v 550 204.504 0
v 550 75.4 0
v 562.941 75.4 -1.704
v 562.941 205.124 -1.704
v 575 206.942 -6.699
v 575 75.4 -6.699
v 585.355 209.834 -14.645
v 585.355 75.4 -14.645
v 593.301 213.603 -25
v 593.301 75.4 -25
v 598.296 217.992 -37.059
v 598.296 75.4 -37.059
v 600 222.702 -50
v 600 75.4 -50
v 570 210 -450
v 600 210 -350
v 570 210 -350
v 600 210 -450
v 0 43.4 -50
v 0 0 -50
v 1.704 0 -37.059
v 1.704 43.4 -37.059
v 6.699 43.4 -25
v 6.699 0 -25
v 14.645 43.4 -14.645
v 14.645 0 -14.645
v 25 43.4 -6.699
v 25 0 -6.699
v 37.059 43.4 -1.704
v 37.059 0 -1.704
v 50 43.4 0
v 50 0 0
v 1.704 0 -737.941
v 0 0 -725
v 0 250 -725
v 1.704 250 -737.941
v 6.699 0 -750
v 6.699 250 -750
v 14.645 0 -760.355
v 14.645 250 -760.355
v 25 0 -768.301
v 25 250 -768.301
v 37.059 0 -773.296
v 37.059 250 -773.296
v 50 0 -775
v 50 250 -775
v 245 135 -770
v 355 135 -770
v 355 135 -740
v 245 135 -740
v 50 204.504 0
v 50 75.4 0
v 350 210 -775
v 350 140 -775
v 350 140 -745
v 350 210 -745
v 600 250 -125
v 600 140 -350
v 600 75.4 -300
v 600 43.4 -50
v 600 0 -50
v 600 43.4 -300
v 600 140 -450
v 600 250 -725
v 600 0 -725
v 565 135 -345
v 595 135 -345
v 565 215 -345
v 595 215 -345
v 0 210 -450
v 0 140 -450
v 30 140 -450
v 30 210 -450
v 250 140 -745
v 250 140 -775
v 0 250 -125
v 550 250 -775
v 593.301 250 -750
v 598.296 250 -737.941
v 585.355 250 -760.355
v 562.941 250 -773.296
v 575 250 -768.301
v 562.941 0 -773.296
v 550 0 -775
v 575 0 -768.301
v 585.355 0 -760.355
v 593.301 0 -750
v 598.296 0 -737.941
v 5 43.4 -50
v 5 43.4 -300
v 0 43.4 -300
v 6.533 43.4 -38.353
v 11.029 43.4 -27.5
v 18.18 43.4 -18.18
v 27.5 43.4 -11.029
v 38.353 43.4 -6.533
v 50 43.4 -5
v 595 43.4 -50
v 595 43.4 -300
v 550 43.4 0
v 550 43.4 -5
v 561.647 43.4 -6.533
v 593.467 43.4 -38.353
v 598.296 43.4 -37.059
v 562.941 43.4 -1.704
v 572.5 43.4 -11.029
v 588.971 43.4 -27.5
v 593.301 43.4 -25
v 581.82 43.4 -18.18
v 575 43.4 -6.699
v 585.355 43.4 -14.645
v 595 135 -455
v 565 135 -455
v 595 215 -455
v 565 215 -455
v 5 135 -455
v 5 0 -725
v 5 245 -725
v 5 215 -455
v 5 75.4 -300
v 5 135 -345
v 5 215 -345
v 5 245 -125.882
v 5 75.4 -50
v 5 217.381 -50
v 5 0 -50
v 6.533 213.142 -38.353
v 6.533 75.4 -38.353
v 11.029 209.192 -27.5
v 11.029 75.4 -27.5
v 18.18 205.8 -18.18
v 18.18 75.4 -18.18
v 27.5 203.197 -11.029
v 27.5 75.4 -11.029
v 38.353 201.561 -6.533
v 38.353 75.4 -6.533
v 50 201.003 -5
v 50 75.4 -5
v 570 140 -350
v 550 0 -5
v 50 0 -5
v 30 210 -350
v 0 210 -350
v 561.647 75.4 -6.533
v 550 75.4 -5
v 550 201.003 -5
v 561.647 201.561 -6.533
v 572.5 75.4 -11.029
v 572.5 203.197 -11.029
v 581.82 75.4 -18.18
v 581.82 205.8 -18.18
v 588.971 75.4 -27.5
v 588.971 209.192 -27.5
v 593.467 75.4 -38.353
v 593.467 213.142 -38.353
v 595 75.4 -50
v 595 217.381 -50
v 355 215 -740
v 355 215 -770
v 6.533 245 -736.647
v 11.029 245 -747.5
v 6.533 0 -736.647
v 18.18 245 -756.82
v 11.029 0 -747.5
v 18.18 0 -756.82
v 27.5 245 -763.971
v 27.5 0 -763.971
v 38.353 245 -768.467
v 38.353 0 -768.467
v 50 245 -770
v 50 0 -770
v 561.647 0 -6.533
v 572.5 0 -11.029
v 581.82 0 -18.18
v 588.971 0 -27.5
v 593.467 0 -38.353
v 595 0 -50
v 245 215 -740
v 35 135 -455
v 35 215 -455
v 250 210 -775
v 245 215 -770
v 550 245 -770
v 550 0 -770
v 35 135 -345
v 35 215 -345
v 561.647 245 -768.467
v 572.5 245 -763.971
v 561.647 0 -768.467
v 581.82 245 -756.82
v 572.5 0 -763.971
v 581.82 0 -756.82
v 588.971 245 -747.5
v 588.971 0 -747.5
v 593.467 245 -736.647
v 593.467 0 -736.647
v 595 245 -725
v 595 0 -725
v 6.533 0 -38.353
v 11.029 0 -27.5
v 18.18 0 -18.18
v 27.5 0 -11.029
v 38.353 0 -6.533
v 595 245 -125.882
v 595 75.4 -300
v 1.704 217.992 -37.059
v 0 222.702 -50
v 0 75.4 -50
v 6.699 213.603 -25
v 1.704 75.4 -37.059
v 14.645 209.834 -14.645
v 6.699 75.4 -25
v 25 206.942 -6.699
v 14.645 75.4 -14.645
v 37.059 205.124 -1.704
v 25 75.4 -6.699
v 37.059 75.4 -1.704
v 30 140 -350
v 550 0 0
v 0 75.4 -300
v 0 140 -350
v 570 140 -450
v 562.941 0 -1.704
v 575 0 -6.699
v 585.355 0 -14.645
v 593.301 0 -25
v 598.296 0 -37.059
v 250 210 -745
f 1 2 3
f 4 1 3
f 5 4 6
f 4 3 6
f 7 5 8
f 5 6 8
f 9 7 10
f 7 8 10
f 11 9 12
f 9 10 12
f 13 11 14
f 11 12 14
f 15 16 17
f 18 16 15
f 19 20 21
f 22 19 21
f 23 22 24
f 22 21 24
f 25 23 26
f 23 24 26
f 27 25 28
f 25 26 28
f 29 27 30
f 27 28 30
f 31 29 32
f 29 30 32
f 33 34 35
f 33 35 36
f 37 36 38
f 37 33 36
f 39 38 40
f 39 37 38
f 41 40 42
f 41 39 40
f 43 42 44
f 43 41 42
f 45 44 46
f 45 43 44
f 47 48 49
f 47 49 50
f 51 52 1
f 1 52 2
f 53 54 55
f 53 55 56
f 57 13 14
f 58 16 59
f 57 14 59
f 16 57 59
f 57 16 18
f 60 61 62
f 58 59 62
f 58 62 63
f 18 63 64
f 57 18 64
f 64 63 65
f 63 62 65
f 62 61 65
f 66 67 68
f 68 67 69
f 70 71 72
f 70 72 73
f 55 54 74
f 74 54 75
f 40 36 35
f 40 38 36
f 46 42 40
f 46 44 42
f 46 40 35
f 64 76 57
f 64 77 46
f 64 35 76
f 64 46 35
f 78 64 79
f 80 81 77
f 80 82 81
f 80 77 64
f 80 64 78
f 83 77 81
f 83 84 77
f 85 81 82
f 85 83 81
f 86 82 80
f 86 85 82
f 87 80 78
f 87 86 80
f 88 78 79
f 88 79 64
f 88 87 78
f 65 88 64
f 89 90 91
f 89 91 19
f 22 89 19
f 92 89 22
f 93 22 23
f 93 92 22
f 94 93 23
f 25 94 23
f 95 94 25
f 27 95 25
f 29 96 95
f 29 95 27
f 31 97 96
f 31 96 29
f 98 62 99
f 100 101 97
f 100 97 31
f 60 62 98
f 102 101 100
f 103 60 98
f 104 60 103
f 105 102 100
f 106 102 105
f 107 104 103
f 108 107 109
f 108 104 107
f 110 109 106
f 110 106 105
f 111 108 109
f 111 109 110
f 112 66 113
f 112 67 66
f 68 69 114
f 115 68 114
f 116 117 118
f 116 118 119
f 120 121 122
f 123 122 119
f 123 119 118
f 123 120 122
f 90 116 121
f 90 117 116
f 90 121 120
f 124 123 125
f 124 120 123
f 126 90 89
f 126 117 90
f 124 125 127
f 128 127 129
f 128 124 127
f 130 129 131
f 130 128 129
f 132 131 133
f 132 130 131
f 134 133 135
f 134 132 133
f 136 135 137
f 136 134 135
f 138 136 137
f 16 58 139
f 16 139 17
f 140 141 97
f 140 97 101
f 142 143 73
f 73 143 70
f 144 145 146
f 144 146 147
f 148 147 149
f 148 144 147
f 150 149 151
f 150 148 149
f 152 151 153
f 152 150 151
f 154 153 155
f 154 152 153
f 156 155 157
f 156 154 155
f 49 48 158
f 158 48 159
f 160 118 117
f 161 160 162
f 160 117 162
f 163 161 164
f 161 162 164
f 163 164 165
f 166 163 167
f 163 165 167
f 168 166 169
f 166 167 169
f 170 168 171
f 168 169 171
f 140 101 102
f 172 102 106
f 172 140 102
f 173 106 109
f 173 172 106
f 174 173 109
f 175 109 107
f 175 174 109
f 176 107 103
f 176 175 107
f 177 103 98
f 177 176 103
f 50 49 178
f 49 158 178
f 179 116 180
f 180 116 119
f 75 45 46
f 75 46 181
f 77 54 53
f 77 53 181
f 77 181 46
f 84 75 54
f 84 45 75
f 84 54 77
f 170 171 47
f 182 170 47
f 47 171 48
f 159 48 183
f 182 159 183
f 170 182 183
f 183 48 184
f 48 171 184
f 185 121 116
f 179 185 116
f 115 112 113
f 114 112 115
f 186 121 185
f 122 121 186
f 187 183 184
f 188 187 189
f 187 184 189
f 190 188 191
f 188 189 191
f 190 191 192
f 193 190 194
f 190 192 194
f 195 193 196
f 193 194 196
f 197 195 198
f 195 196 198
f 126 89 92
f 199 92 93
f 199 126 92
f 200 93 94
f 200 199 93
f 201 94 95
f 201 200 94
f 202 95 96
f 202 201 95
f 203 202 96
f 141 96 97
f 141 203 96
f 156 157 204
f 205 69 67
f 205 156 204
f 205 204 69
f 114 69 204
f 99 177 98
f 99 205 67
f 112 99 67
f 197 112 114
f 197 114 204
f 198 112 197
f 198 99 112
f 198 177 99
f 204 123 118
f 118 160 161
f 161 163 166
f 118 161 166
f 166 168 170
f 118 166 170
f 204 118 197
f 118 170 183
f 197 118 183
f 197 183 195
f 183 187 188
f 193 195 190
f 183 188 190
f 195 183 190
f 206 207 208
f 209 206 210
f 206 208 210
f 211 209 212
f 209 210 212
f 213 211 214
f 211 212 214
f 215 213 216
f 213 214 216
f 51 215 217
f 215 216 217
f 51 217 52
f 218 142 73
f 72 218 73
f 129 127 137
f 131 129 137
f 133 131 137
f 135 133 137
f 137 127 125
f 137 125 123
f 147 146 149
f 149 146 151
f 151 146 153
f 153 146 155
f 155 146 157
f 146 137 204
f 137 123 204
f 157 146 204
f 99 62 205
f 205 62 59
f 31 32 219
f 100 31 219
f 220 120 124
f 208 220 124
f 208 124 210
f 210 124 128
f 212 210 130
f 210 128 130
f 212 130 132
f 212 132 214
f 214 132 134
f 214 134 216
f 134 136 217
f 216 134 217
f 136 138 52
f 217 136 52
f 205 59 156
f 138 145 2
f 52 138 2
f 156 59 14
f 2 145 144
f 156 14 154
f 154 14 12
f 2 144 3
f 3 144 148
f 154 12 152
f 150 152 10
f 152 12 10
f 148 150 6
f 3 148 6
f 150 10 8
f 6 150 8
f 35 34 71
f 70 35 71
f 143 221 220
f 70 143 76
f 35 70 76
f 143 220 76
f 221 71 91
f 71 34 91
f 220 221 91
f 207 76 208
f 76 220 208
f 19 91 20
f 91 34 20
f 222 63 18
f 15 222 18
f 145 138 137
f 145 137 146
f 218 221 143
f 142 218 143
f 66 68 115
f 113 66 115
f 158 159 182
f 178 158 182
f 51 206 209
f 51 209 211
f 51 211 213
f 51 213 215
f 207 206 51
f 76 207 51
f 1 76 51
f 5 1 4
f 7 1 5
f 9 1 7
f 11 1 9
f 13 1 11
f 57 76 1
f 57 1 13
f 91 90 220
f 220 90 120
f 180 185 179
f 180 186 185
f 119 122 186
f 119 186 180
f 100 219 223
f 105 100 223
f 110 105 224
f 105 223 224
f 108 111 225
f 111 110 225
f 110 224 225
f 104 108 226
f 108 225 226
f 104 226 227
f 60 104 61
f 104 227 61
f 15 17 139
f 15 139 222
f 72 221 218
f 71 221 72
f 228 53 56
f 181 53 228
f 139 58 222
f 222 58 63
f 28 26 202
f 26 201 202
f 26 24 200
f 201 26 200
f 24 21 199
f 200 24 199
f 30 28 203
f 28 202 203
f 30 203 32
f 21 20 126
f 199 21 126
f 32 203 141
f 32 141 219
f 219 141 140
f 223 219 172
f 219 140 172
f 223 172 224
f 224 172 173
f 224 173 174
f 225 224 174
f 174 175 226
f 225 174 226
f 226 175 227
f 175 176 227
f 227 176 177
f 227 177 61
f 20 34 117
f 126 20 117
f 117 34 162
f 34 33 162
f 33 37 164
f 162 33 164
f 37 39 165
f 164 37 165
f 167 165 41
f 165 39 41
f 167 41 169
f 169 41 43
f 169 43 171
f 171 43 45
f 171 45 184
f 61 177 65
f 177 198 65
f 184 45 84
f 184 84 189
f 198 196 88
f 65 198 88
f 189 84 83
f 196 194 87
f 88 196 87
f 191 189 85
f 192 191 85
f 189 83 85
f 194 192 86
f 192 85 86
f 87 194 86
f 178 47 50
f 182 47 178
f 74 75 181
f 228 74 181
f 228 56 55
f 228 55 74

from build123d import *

# Parameters (mm, degrees)
BOSS_EXTRUDE1_DEPTH     = 200
BOSS_EXTRUDE2_DEPTH     = 50
DRAFT2_START            = 200
DRAFT2_DEPTH            = 50
DRAFT2_START_2          = 192.170637281
DRAFT2_2_OUTLINE_W      = 602
DRAFT2_2_OUTLINE_H      = 136
DRAFT2_2_DEPTH          = 43.829362719
SKETCH12_W              = 100
SKETCH12_H              = 70
CUT_EXTRUDE4_DEPTH      = 30
SKETCH14_W              = 100
SKETCH14_H              = 70
CUT_EXTRUDE5_DEPTH      = 30
SKETCH13_W              = 100
SKETCH13_H              = 70
CUT_EXTRUDE2_DEPTH      = 30
SHELL1_T                = -5
CUT_EXTRUDE6_DEPTH      = 1012.496416207
CUT_EXTRUDE6_DEPTH_BACK = 1012.496416207
SKETCH15_W              = 300
SKETCH15_H              = 32


with BuildPart() as part:
    # Sketch1 → Boss-Extrude1 (new body)
    with BuildSketch(Plane(origin=(0, 0, 0), x_dir=(1, 0, 0), z_dir=(0, 1, 0))):
        with BuildLine():
            Line((50, 0), (550, 0))
            ThreePointArc((550, 0), (585.355339059, 14.644660941), (600, 50))
            Line((600, 50), (600, 725))
            ThreePointArc((600, 725), (585.355339059, 760.355339059), (550, 775))
            Line((550, 775), (50, 775))
            ThreePointArc((50, 775), (14.644660941, 760.355339059), (0, 725))
            Line((0, 725), (0, 50))
            ThreePointArc((0, 50), (14.644660941, 14.644660941), (50, 0))
        make_face()
    extrude(amount=BOSS_EXTRUDE1_DEPTH)

    # Sketch5 → Boss-Extrude2 (add)
    with BuildSketch(Plane(origin=(0, 200, 0), x_dir=(1, 0, 0), z_dir=(0, 1, 0))):
        with BuildLine():
            Line((600, 125), (0, 125))
            Line((0, 125), (0, 725))
            ThreePointArc((0, 725), (14.644660941, 760.355339059), (50, 775))
            Line((50, 775), (550, 775))
            ThreePointArc((550, 775), (585.355339059, 760.355339059), (600, 725))
            Line((600, 725), (600, 125))
        make_face()
    extrude(amount=BOSS_EXTRUDE2_DEPTH)

    # Draft2: read off the stored shape, not the designer's step
    # Draft2 outline → Draft2 (add)
    with BuildSketch(Plane(origin=(0, 0, 0), x_dir=(1, 0, 0), z_dir=(0, 1, 0)).offset(DRAFT2_START)):
        with BuildLine():
            ThreePointArc((550, 0), (585.355339059, 14.644660941), (600, 50))
            Line((600, 50), (600, 125))
            Line((600, 125), (0, 125))
            Line((0, 125), (0, 50))
            ThreePointArc((0, 50), (14.644660941, 14.644660941), (50, 0))
            Line((50, 0), (550, 0))
        make_face()
    extrude(amount=DRAFT2_DEPTH)

    # Draft2 2 outline → Draft2 2 (cut)
    with BuildSketch(Plane(origin=(0, 0, 0), x_dir=(1, 0, 0), z_dir=(0, 0.9396926207859094, 0.34202014332566616)).offset(DRAFT2_START_2)):
        with Locations((300, 136)):
            Rectangle(DRAFT2_2_OUTLINE_W, DRAFT2_2_OUTLINE_H)
    extrude(amount=DRAFT2_2_DEPTH, mode=Mode.SUBTRACT)

    # Sketch12 → Cut-Extrude4 (cut)
    with BuildSketch(Plane(origin=(0, 0, 0), x_dir=(0, 0, -1), z_dir=(1, 0, 0))):
        with Locations((400, 175)):
            Rectangle(SKETCH12_W, SKETCH12_H)
    extrude(amount=CUT_EXTRUDE4_DEPTH, mode=Mode.SUBTRACT)

    # Sketch14 → Cut-Extrude5 (cut)
    with BuildSketch(Plane(origin=(600, 0, 0), x_dir=(0, 0, -1), z_dir=(1, 0, 0))):
        with Locations((400, 175)):
            Rectangle(SKETCH14_W, SKETCH14_H)
    extrude(amount=-CUT_EXTRUDE5_DEPTH, mode=Mode.SUBTRACT)

    # Sketch13 → Cut-Extrude2 (cut)
    with BuildSketch(Plane(origin=(0, 0, -775), x_dir=(-1, 0, 0), z_dir=(0, 0, -1))):
        with Locations((-300, 175)):
            Rectangle(SKETCH13_W, SKETCH13_H)
    extrude(amount=-CUT_EXTRUDE2_DEPTH, mode=Mode.SUBTRACT)

    # Shell1
    shell1_openings = [part.faces().sort_by_distance(p)[0] for p in [
        (300, 0, -387.5),
    ]]
    offset(amount=SHELL1_T, openings=shell1_openings, kind=Kind.INTERSECTION)

    # Sketch15 → Cut-Extrude6 (cut, two sides: drawn at the far end of the back side and taken through both)
    with BuildSketch(Plane.ZY.offset(-CUT_EXTRUDE6_DEPTH_BACK)):
        with Locations((-150, 59.4)):
            Rectangle(SKETCH15_W, SKETCH15_H)
    extrude(amount=CUT_EXTRUDE6_DEPTH + CUT_EXTRUDE6_DEPTH_BACK, mode=Mode.SUBTRACT)


solid = part.part
